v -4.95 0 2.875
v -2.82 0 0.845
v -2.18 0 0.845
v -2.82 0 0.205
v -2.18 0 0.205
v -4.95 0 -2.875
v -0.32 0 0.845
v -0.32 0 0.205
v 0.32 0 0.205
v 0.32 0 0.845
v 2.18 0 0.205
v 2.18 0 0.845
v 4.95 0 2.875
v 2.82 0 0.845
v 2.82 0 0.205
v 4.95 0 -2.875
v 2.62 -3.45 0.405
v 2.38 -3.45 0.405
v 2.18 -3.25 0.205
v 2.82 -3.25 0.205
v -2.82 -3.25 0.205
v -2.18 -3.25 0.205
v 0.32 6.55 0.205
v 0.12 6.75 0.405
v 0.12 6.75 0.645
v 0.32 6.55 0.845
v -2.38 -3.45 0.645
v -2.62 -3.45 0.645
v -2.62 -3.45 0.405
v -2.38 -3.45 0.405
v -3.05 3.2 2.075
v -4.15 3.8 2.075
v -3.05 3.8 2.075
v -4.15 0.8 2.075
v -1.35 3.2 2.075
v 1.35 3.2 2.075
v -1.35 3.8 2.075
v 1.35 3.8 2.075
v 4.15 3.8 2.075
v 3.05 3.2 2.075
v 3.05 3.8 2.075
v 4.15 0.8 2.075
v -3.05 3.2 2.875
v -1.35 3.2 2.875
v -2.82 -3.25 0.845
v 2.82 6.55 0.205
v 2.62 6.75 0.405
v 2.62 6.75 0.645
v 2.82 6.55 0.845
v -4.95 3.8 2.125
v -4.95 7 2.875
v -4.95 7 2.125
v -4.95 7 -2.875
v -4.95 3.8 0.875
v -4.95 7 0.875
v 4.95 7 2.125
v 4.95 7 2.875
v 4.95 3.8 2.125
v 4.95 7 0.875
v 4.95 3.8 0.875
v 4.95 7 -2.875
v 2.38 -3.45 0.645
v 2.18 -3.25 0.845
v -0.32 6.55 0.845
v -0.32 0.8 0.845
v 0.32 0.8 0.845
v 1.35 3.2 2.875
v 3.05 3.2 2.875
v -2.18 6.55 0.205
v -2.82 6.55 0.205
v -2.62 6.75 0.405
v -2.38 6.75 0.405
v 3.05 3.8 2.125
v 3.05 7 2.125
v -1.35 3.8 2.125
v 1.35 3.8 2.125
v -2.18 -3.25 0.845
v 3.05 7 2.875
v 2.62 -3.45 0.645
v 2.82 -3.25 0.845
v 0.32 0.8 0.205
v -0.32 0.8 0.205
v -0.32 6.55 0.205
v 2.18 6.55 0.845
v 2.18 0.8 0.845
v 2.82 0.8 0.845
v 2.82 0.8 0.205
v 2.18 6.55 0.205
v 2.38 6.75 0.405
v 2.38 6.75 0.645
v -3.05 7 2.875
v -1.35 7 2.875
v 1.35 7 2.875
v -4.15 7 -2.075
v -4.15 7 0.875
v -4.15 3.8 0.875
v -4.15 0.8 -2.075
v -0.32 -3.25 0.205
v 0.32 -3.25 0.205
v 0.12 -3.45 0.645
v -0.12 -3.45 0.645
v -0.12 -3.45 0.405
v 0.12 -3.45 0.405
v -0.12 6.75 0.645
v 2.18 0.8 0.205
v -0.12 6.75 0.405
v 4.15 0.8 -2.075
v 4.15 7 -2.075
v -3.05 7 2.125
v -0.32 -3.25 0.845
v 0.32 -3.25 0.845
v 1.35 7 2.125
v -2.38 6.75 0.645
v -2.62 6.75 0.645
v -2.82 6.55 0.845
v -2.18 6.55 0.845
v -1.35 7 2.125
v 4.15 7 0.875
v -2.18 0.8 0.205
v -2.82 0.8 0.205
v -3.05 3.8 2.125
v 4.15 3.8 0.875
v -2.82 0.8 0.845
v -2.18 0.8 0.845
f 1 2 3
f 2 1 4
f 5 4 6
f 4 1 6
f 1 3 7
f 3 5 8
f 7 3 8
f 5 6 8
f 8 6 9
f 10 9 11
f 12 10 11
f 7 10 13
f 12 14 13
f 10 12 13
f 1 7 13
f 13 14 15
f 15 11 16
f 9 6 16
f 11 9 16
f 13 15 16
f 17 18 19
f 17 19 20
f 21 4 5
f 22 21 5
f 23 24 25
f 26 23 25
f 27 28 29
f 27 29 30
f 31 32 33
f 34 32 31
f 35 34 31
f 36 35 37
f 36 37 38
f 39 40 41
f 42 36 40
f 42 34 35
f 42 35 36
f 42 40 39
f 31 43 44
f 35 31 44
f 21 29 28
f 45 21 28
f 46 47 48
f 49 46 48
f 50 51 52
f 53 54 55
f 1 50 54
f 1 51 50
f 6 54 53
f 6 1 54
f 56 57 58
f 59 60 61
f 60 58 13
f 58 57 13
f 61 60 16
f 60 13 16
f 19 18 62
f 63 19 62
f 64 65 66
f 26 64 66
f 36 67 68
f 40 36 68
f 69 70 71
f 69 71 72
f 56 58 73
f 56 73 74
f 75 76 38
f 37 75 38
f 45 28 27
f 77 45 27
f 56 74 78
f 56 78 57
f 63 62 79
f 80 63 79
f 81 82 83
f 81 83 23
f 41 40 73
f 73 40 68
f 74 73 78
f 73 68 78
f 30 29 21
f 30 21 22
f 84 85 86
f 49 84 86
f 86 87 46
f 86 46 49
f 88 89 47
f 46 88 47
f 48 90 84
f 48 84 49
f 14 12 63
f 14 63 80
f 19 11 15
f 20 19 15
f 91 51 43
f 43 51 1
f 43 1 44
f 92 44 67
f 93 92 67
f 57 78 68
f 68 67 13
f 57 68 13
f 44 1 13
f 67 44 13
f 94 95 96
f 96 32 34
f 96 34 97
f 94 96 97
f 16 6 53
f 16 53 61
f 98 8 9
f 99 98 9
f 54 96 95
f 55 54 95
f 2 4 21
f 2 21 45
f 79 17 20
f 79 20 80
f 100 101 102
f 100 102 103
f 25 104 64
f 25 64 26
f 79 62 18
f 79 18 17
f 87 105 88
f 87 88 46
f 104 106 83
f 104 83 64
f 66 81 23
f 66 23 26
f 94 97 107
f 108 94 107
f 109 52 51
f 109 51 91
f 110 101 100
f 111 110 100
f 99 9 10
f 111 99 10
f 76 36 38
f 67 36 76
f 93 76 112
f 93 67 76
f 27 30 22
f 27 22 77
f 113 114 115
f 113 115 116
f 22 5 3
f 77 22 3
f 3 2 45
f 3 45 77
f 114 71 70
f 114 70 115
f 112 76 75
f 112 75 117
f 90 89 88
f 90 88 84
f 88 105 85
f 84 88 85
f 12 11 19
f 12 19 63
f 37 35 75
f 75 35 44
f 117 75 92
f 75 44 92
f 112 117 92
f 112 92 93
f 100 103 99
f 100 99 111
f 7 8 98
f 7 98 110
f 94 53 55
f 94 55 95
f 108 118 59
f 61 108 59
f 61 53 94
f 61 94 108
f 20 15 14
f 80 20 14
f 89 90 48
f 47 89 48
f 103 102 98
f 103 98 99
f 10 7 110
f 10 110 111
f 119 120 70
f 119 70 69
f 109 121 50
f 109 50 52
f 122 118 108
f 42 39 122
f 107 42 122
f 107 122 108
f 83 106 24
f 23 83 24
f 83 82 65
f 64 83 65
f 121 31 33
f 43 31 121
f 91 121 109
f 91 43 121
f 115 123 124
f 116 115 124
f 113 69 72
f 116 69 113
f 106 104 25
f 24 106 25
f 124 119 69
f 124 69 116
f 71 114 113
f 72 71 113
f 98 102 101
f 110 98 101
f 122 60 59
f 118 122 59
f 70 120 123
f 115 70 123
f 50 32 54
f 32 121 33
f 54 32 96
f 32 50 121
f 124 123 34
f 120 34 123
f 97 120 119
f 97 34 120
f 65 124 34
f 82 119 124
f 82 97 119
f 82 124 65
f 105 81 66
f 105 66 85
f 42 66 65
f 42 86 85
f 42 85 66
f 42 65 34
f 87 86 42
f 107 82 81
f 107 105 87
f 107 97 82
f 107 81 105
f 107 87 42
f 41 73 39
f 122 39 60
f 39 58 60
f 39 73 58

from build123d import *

# Parameters (mm, degrees)
SKETCH1_W                = 9.9
SKETCH1_H                = 5.75
BOSS_EXTRUDE1_DEPTH      = 7
SHELL1_T                 = -0.8
SKETCH2_W                = 1.25
SKETCH2_H                = 3.2
CUT_EXTRUDE1_DEPTH       = 10.9
CUT_EXTRUDE2_REACH       = 7.75
SKETCH3_W                = 1.7
SKETCH3_H                = 3.8
SKETCH4_W                = 0.64
SKETCH4_H                = 0.64
BOSS_EXTRUDE2_DEPTH      = 3.45
BOSS_EXTRUDE2_DEPTH_BACK = 6.75
CHAMFER1_SIZE            = 0.2


with BuildPart() as part:
    # Sketch1 → Boss-Extrude1 (new body)
    with BuildSketch(Plane(origin=(0, 0, 0), x_dir=(1, 0, 0), z_dir=(0, 1, 0))):
        Rectangle(SKETCH1_W, SKETCH1_H)
    extrude(amount=BOSS_EXTRUDE1_DEPTH)

    # Shell1
    shell1_openings = [part.faces().sort_by_distance(p)[0] for p in [
        (0, 7, 0),
    ]]
    offset(amount=SHELL1_T, openings=shell1_openings, kind=Kind.INTERSECTION)

    # Sketch2 → Cut-Extrude1 (cut, through all)
    with BuildSketch(Plane(origin=(4.95, 0, 0), x_dir=(0, 0, -1), z_dir=(1, 0, 0))):
        with Locations((-1.5, 5.4)):
            Rectangle(SKETCH2_W, SKETCH2_H)
    extrude(amount=-CUT_EXTRUDE1_DEPTH, mode=Mode.SUBTRACT)

    # Sketch3 → Cut-Extrude2 (cut, up to next)
    with BuildSketch(Plane.XY.offset(2.875), mode=Mode.PRIVATE) as cut_extrude2_sk1:
        with Locations((-2.2, 5.1)):
            Rectangle(SKETCH3_W, SKETCH3_H)
    cut_extrude2_tool1 = extrude(cut_extrude2_sk1.sketch, amount=-CUT_EXTRUDE2_REACH, mode=Mode.PRIVATE) & part.part
    add(cut_extrude2_tool1.solids().sort_by_distance((-2.2, 5.1, 2.875))[0], mode=Mode.SUBTRACT)
    # Sketch3 → Cut-Extrude2 (cut, up to next)
    with BuildSketch(Plane.XY.offset(2.875), mode=Mode.PRIVATE) as cut_extrude2_sk2:
        with Locations((2.2, 5.1)):
            Rectangle(SKETCH3_W, SKETCH3_H)
    cut_extrude2_tool2 = extrude(cut_extrude2_sk2.sketch, amount=-CUT_EXTRUDE2_REACH, mode=Mode.PRIVATE) & part.part
    add(cut_extrude2_tool2.solids().sort_by_distance((2.2, 5.1, 2.875))[0], mode=Mode.SUBTRACT)

    # Sketch4 → Boss-Extrude2 (add, two sides)
    with BuildSketch(Plane.XZ) as boss_extrude2_sk:
        with Locations((-2.5, 0.525)):
            Rectangle(SKETCH4_W, SKETCH4_H)
        with Locations((0, 0.525)):
            Rectangle(SKETCH4_W, SKETCH4_H)
        with Locations((2.5, 0.525)):
            Rectangle(SKETCH4_W, SKETCH4_H)
    extrude(amount=BOSS_EXTRUDE2_DEPTH)
    extrude(boss_extrude2_sk.sketch, amount=-BOSS_EXTRUDE2_DEPTH_BACK)

    # Chamfer1
    chamfer1_edges = [part.edges().sort_by_distance(p)[0] for p in [
        (0.32, 6.75, 0.525),
        (0, 6.75, 0.205),
        (-0.32, 6.75, 0.525),
        (0, 6.75, 0.845),
        (0.32, -3.45, 0.525),
        (0, -3.45, 0.845),
        (-0.32, -3.45, 0.525),
        (0, -3.45, 0.205),
        (2.82, 6.75, 0.525),
        (2.5, 6.75, 0.205),
        (2.18, 6.75, 0.525),
        (2.5, 6.75, 0.845),
        (2.82, -3.45, 0.525),
        (2.5, -3.45, 0.845),
        (2.18, -3.45, 0.525),
        (2.5, -3.45, 0.205),
        (-2.18, 6.75, 0.525),
        (-2.5, 6.75, 0.205),
        (-2.82, 6.75, 0.525),
        (-2.5, 6.75, 0.845),
        (-2.18, -3.45, 0.525),
        (-2.5, -3.45, 0.845),
        (-2.82, -3.45, 0.525),
        (-2.5, -3.45, 0.205),
    ]]
    chamfer(chamfer1_edges, length=CHAMFER1_SIZE)


solid = part.part
